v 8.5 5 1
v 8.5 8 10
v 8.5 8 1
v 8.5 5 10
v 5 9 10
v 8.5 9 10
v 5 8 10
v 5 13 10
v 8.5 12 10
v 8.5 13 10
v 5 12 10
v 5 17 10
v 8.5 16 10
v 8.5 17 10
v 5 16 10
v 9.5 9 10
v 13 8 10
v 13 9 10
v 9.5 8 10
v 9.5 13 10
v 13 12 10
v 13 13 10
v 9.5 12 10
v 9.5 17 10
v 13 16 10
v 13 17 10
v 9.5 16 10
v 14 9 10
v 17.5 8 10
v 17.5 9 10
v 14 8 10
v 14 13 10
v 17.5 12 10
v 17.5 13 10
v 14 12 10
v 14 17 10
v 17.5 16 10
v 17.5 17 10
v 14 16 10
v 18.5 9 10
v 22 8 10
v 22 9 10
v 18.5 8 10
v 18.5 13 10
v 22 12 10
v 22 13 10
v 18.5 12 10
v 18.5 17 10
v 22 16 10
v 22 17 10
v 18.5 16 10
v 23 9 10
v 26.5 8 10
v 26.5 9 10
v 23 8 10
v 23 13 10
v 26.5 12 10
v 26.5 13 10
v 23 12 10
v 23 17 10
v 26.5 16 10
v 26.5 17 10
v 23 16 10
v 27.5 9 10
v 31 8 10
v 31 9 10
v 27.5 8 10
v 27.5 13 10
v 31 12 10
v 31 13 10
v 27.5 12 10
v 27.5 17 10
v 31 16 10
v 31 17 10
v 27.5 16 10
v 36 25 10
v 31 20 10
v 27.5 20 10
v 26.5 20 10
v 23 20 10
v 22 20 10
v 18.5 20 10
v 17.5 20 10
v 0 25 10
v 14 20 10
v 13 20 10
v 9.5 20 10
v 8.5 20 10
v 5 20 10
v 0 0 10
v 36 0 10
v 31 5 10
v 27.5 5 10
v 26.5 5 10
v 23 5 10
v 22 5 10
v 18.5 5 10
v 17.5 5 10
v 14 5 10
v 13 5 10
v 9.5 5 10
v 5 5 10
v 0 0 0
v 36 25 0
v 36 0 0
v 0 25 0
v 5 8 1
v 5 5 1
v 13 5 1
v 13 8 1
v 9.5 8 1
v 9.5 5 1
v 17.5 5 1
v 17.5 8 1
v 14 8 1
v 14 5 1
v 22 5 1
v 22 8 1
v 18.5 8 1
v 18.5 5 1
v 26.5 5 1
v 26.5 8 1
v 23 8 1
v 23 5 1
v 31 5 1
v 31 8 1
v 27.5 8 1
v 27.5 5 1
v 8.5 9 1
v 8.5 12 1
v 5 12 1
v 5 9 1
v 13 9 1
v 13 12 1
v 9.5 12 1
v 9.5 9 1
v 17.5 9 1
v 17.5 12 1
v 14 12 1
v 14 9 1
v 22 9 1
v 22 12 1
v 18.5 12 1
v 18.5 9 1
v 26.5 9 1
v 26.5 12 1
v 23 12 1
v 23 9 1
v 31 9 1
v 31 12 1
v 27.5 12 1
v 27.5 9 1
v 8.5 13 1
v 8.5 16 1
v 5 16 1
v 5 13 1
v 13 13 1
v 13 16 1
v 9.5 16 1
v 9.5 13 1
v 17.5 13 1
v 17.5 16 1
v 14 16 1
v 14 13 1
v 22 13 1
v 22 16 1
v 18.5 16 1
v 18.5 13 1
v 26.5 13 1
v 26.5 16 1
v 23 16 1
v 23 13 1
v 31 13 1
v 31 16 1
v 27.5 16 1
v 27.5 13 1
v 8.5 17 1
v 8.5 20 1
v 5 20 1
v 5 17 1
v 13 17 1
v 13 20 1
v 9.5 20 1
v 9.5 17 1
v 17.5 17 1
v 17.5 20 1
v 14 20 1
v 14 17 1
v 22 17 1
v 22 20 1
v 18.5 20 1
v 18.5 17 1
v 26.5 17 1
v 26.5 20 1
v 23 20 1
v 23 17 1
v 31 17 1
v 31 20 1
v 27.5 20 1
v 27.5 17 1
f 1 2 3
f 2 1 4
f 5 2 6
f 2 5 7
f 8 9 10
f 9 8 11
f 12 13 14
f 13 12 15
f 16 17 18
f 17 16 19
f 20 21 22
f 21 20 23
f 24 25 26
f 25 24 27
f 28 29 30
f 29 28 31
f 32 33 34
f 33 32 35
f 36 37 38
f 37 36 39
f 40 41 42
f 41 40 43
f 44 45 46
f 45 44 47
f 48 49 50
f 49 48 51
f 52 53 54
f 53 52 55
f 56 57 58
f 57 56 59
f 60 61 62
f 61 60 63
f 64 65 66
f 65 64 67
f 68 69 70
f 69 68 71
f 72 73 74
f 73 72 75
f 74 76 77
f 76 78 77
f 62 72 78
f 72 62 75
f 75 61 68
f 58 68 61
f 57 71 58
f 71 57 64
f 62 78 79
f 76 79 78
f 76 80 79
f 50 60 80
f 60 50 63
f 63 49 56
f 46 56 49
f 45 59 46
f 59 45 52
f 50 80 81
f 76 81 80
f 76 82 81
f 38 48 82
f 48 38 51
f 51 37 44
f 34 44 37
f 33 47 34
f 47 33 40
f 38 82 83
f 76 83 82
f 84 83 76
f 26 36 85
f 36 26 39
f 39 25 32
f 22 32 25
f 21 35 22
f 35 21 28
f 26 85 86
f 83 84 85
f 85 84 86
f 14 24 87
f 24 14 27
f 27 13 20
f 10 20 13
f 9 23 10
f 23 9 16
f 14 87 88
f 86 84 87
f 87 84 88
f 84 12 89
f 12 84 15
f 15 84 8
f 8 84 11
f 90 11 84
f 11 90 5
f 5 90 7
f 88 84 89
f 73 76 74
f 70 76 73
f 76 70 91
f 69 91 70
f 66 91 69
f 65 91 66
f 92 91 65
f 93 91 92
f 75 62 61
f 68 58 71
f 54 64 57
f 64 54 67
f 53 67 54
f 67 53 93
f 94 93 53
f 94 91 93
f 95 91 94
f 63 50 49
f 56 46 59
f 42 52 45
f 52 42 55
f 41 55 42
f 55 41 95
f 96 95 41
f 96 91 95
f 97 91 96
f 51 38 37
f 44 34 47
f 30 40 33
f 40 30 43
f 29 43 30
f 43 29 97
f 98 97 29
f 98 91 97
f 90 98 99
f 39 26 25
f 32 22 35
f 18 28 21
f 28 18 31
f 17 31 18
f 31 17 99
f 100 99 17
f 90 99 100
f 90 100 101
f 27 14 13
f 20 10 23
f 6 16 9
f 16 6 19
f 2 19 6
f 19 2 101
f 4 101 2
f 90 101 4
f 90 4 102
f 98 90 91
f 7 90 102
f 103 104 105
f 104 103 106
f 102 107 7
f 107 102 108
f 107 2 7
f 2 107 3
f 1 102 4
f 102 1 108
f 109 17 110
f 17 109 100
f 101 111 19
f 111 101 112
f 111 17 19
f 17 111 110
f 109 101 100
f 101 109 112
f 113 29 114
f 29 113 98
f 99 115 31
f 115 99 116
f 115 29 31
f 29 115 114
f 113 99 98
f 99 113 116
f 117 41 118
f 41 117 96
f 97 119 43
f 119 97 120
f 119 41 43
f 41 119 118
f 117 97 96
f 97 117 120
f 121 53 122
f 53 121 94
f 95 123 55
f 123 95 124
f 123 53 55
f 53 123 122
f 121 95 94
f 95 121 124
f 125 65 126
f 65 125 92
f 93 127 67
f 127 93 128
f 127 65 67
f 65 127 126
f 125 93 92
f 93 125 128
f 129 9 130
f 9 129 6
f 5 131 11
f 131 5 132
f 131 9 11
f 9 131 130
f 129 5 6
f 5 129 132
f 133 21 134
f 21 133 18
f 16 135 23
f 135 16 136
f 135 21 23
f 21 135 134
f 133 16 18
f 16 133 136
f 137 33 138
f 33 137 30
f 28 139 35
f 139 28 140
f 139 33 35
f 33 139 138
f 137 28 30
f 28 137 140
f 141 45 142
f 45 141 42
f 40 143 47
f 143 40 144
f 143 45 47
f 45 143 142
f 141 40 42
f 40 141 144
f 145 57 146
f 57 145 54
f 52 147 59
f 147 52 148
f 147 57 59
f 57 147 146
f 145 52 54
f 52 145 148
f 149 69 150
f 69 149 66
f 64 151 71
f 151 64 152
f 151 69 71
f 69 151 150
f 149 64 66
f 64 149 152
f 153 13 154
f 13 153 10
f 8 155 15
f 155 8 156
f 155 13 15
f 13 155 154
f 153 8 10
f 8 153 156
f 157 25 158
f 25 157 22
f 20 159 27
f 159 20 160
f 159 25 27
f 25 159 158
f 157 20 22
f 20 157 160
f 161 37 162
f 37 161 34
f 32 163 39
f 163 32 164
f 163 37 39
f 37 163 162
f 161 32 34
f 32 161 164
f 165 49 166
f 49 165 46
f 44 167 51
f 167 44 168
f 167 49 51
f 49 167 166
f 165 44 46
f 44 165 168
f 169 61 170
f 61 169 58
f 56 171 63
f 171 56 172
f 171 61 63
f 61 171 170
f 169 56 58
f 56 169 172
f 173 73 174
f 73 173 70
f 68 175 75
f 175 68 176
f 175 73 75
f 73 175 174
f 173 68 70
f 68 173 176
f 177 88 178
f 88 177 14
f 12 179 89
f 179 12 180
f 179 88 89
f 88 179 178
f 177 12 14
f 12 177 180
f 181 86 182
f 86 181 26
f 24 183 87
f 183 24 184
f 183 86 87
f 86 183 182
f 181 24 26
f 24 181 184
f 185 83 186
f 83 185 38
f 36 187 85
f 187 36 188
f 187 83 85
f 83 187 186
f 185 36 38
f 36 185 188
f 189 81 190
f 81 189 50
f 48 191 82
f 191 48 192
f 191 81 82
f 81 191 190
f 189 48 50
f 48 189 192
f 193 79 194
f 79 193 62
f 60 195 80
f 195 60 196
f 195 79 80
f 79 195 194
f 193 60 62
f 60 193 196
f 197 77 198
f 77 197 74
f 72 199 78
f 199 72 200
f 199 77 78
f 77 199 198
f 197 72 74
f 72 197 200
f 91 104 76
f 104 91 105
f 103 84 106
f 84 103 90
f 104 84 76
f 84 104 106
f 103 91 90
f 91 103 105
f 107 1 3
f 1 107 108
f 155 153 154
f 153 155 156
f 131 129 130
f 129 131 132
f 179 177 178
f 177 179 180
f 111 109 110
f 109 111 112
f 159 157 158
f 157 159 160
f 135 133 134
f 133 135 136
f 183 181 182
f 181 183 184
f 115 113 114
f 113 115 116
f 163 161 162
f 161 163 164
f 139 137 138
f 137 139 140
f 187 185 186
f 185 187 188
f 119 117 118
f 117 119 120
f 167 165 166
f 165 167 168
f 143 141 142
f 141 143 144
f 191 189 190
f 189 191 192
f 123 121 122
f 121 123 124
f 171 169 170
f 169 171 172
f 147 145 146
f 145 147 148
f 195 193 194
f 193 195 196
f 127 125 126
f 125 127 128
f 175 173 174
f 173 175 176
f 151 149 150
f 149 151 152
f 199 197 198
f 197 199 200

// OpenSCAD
module chamber(chamberSize = [36,25,10], grid = [6,4], griddW = 1, edgedW = 4){
    
    geneFrameL = chamberSize[0];
    geneFrameW = chamberSize[1];
    height = chamberSize[2];

    
    nX = grid[0];
    nY = grid[1];
    
    wellL = (geneFrameL - 2*edgedW - (nX + 1) * griddW) / nX;
    wellW = (geneFrameW - 2*edgedW - (nY + 1) * griddW) / nY;
    
    echo(wellL, wellW);
    
    difference(){
        cube([geneFrameL, geneFrameW, height]);
        for(i = [0:nY-1]){
            dY = griddW + edgedW + i * ( griddW + wellW );
            for(j = [0:nX-1]){
                dX = griddW + edgedW + j * ( griddW + wellL );
                translate([dX, dY]) cube([wellL, wellW, height]);
            }
        }  
    }
    cube([geneFrameL, geneFrameW, 1]);
}

chamber();
